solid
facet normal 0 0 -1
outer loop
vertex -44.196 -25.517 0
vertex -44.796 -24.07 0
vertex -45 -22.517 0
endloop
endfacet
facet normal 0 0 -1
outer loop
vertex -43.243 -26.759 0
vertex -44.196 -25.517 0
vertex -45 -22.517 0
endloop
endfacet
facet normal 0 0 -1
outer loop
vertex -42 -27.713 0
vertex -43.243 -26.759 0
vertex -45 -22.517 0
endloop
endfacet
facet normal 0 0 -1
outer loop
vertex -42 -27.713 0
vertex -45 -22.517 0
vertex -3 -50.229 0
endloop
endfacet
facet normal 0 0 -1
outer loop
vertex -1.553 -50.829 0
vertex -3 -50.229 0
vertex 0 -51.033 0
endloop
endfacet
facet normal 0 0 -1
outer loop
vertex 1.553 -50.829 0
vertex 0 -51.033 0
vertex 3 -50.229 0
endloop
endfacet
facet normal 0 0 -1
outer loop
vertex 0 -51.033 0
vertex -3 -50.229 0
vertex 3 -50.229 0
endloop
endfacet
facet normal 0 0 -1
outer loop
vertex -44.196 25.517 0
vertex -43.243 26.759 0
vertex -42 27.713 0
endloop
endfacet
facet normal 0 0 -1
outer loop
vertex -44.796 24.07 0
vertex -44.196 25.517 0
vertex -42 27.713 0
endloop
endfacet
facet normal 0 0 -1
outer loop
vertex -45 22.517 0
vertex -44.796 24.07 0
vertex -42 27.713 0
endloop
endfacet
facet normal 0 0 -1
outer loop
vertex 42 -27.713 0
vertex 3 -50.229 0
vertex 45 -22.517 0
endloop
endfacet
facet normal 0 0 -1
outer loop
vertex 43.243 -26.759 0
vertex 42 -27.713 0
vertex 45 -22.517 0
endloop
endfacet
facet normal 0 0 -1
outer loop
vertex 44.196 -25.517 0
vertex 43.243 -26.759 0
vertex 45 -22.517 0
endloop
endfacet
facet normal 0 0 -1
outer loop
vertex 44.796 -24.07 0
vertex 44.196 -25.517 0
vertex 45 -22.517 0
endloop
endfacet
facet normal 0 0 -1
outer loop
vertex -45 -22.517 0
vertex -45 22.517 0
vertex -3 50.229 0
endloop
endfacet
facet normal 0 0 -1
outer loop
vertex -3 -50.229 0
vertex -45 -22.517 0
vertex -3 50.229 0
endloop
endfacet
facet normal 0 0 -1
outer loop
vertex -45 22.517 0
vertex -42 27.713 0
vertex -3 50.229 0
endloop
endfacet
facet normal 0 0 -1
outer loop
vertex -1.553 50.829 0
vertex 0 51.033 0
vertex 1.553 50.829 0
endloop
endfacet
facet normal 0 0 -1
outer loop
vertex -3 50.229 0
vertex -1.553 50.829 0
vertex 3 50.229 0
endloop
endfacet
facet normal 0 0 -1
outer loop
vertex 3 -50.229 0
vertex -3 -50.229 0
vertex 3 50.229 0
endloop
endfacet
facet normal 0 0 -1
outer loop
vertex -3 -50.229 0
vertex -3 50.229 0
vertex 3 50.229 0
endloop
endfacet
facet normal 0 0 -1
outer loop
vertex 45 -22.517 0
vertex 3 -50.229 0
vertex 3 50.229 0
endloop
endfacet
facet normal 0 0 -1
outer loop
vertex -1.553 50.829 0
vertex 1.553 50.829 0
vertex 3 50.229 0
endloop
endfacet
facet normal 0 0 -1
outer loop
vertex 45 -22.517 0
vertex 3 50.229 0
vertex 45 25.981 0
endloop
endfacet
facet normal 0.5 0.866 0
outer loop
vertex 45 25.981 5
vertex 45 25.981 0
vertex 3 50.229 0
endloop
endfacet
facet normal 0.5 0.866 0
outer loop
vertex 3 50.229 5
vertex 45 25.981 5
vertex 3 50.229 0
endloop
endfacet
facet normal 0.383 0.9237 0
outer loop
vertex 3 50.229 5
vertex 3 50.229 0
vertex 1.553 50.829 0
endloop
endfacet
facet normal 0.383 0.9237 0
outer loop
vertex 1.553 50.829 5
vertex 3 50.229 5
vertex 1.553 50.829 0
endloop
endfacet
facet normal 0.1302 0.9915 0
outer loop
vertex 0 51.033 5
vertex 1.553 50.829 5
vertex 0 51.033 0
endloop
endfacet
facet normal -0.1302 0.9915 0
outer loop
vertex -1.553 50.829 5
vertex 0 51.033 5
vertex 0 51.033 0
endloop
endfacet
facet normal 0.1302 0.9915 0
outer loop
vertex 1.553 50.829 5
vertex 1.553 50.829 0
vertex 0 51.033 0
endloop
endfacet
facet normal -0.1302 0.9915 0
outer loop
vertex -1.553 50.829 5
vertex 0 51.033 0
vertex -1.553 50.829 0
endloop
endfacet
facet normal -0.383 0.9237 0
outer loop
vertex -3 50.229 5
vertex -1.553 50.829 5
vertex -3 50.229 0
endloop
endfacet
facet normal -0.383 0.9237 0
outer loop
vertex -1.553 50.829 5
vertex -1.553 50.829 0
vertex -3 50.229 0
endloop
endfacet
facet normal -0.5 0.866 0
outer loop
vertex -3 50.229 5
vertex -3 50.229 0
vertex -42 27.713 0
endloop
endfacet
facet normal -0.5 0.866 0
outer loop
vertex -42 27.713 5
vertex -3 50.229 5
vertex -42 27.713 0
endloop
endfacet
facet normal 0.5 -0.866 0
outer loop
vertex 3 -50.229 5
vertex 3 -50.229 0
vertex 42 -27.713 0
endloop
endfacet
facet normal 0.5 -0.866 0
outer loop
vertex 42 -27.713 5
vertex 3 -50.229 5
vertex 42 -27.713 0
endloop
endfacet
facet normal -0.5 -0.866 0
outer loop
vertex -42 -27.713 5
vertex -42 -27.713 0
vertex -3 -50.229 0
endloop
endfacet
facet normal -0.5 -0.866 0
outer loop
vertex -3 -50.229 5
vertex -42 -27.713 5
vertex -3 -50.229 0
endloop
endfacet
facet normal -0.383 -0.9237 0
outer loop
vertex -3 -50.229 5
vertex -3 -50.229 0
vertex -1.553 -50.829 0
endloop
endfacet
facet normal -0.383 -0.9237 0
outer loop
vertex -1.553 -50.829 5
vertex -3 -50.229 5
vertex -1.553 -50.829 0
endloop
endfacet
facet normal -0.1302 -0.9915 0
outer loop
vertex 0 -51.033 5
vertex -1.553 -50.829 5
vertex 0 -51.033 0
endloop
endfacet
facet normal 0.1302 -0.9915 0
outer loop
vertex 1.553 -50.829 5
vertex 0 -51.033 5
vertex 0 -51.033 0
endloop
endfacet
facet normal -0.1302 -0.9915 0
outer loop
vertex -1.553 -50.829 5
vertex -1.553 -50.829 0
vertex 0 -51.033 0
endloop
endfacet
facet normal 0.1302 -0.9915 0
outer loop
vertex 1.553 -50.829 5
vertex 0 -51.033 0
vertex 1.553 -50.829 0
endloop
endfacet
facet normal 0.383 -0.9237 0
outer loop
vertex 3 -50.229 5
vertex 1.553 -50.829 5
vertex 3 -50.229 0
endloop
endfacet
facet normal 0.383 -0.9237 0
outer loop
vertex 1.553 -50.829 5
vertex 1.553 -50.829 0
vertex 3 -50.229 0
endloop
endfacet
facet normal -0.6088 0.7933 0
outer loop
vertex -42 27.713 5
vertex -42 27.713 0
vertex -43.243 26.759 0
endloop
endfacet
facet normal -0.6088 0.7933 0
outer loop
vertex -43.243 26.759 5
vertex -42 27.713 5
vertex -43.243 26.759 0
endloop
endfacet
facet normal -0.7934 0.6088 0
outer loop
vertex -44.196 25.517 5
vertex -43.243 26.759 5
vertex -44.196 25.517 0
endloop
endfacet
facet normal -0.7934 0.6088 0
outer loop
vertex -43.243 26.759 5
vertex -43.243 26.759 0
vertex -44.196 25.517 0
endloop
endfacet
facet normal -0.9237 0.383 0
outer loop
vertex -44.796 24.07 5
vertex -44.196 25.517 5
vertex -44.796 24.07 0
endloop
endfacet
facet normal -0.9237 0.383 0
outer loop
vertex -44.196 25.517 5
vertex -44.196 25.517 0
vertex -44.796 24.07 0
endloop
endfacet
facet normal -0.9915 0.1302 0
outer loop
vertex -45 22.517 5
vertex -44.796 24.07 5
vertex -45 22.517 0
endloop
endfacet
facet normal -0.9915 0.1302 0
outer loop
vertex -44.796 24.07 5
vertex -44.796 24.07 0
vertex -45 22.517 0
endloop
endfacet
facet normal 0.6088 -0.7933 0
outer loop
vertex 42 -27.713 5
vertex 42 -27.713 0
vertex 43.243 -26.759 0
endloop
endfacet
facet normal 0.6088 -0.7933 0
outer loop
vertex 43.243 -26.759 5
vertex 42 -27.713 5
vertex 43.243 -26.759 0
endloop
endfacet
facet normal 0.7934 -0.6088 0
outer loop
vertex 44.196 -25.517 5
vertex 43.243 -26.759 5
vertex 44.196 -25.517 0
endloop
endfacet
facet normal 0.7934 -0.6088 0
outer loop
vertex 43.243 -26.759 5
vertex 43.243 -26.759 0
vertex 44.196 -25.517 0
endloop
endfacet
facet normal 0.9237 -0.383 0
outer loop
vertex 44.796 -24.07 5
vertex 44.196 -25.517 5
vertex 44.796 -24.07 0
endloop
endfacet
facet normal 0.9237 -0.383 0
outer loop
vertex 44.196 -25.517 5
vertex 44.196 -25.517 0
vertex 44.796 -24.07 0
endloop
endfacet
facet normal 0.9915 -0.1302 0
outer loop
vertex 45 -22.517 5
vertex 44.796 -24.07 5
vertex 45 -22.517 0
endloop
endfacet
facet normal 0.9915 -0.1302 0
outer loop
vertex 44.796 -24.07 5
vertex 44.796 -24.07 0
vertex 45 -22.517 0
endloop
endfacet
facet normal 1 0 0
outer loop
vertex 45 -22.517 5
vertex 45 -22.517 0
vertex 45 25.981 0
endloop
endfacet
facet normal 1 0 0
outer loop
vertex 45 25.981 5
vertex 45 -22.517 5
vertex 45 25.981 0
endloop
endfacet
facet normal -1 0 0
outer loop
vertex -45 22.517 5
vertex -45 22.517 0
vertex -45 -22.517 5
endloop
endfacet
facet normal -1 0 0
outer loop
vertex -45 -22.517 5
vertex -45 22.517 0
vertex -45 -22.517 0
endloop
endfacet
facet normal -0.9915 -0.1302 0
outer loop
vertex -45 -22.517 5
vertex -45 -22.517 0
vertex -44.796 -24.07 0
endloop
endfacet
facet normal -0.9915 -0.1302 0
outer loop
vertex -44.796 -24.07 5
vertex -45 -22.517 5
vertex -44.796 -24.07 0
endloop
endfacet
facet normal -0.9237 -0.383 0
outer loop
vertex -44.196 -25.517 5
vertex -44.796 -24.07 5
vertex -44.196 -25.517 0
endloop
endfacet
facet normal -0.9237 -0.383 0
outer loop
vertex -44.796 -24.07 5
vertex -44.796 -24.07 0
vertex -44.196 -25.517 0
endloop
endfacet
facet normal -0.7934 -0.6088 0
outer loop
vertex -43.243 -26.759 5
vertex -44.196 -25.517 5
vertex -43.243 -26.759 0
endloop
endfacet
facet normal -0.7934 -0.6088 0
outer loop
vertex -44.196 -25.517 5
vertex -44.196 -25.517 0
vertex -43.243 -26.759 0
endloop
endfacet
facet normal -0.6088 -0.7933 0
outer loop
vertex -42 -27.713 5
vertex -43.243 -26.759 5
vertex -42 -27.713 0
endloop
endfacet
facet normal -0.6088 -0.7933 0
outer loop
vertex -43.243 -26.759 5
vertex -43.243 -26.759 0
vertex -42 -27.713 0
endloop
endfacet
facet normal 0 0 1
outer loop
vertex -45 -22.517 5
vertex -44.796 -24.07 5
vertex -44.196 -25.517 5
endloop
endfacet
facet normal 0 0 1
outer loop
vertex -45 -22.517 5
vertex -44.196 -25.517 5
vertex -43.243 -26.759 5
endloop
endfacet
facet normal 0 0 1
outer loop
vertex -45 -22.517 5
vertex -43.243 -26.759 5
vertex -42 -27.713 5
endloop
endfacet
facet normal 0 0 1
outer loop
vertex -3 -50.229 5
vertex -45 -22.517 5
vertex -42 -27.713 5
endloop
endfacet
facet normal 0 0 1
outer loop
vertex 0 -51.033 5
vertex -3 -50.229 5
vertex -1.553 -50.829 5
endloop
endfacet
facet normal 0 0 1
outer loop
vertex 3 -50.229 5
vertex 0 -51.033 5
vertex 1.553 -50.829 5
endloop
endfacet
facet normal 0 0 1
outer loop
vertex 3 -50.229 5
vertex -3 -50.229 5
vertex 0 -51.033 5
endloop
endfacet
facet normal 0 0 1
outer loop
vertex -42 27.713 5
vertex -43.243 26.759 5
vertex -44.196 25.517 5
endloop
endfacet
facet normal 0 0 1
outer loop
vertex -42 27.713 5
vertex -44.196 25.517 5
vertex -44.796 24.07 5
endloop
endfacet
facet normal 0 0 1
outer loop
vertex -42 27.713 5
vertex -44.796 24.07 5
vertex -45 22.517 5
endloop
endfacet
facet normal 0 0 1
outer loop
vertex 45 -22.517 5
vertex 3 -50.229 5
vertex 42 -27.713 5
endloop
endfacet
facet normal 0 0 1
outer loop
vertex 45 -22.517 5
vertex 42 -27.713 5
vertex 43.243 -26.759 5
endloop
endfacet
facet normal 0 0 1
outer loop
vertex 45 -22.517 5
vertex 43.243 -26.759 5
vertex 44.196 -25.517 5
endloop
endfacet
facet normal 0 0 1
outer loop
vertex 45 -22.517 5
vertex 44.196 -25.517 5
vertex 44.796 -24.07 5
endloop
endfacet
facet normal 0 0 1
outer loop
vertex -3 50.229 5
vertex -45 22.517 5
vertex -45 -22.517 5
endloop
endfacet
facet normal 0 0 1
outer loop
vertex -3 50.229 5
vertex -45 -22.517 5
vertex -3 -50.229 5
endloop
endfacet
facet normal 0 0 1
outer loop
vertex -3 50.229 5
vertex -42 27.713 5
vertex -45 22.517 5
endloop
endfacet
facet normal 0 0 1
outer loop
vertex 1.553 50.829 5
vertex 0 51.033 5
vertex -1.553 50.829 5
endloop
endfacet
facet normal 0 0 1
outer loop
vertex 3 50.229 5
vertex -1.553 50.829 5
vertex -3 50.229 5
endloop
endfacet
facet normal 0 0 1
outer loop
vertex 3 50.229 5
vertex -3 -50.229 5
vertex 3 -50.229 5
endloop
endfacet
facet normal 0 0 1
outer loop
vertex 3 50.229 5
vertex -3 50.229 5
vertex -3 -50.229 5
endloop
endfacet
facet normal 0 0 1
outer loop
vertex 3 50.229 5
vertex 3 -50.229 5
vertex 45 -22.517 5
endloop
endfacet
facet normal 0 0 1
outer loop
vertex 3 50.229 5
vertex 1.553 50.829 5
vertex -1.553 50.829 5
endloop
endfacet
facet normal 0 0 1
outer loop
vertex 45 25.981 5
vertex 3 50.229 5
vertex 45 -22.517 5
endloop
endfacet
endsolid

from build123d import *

# Parameters (mm, degrees)
F1_DEPTH = 5


with BuildPart() as f1:
    # F0 (on Top) → F1 (new body)
    with BuildSketch(Plane.XY):
        with BuildLine():
            Line((45, 25.980762), (3, 50.229473))
            ThreePointArc((3, 50.229473), (0, 51.033321), (-3, 50.229473))
            Line((-3, 50.229473), (-42, 27.712813))
            ThreePointArc((-42, 27.712813), (-44.196152, 25.51666), (-45, 22.51666))
            Line((-45, 22.51666), (-45, -22.51666))
            ThreePointArc((-45, -22.51666), (-44.196152, -25.51666), (-42, -27.712813))
            Line((-42, -27.712813), (-3, -50.229473))
            ThreePointArc((-3, -50.229473), (0, -51.033321), (3, -50.229473))
            Line((3, -50.229473), (42, -27.712813))
            ThreePointArc((42, -27.712813), (44.196152, -25.51666), (45, -22.51666))
            Line((45, -22.51666), (45, 25.980762))
        make_face()
    extrude(amount=F1_DEPTH)


solid = f1.part
